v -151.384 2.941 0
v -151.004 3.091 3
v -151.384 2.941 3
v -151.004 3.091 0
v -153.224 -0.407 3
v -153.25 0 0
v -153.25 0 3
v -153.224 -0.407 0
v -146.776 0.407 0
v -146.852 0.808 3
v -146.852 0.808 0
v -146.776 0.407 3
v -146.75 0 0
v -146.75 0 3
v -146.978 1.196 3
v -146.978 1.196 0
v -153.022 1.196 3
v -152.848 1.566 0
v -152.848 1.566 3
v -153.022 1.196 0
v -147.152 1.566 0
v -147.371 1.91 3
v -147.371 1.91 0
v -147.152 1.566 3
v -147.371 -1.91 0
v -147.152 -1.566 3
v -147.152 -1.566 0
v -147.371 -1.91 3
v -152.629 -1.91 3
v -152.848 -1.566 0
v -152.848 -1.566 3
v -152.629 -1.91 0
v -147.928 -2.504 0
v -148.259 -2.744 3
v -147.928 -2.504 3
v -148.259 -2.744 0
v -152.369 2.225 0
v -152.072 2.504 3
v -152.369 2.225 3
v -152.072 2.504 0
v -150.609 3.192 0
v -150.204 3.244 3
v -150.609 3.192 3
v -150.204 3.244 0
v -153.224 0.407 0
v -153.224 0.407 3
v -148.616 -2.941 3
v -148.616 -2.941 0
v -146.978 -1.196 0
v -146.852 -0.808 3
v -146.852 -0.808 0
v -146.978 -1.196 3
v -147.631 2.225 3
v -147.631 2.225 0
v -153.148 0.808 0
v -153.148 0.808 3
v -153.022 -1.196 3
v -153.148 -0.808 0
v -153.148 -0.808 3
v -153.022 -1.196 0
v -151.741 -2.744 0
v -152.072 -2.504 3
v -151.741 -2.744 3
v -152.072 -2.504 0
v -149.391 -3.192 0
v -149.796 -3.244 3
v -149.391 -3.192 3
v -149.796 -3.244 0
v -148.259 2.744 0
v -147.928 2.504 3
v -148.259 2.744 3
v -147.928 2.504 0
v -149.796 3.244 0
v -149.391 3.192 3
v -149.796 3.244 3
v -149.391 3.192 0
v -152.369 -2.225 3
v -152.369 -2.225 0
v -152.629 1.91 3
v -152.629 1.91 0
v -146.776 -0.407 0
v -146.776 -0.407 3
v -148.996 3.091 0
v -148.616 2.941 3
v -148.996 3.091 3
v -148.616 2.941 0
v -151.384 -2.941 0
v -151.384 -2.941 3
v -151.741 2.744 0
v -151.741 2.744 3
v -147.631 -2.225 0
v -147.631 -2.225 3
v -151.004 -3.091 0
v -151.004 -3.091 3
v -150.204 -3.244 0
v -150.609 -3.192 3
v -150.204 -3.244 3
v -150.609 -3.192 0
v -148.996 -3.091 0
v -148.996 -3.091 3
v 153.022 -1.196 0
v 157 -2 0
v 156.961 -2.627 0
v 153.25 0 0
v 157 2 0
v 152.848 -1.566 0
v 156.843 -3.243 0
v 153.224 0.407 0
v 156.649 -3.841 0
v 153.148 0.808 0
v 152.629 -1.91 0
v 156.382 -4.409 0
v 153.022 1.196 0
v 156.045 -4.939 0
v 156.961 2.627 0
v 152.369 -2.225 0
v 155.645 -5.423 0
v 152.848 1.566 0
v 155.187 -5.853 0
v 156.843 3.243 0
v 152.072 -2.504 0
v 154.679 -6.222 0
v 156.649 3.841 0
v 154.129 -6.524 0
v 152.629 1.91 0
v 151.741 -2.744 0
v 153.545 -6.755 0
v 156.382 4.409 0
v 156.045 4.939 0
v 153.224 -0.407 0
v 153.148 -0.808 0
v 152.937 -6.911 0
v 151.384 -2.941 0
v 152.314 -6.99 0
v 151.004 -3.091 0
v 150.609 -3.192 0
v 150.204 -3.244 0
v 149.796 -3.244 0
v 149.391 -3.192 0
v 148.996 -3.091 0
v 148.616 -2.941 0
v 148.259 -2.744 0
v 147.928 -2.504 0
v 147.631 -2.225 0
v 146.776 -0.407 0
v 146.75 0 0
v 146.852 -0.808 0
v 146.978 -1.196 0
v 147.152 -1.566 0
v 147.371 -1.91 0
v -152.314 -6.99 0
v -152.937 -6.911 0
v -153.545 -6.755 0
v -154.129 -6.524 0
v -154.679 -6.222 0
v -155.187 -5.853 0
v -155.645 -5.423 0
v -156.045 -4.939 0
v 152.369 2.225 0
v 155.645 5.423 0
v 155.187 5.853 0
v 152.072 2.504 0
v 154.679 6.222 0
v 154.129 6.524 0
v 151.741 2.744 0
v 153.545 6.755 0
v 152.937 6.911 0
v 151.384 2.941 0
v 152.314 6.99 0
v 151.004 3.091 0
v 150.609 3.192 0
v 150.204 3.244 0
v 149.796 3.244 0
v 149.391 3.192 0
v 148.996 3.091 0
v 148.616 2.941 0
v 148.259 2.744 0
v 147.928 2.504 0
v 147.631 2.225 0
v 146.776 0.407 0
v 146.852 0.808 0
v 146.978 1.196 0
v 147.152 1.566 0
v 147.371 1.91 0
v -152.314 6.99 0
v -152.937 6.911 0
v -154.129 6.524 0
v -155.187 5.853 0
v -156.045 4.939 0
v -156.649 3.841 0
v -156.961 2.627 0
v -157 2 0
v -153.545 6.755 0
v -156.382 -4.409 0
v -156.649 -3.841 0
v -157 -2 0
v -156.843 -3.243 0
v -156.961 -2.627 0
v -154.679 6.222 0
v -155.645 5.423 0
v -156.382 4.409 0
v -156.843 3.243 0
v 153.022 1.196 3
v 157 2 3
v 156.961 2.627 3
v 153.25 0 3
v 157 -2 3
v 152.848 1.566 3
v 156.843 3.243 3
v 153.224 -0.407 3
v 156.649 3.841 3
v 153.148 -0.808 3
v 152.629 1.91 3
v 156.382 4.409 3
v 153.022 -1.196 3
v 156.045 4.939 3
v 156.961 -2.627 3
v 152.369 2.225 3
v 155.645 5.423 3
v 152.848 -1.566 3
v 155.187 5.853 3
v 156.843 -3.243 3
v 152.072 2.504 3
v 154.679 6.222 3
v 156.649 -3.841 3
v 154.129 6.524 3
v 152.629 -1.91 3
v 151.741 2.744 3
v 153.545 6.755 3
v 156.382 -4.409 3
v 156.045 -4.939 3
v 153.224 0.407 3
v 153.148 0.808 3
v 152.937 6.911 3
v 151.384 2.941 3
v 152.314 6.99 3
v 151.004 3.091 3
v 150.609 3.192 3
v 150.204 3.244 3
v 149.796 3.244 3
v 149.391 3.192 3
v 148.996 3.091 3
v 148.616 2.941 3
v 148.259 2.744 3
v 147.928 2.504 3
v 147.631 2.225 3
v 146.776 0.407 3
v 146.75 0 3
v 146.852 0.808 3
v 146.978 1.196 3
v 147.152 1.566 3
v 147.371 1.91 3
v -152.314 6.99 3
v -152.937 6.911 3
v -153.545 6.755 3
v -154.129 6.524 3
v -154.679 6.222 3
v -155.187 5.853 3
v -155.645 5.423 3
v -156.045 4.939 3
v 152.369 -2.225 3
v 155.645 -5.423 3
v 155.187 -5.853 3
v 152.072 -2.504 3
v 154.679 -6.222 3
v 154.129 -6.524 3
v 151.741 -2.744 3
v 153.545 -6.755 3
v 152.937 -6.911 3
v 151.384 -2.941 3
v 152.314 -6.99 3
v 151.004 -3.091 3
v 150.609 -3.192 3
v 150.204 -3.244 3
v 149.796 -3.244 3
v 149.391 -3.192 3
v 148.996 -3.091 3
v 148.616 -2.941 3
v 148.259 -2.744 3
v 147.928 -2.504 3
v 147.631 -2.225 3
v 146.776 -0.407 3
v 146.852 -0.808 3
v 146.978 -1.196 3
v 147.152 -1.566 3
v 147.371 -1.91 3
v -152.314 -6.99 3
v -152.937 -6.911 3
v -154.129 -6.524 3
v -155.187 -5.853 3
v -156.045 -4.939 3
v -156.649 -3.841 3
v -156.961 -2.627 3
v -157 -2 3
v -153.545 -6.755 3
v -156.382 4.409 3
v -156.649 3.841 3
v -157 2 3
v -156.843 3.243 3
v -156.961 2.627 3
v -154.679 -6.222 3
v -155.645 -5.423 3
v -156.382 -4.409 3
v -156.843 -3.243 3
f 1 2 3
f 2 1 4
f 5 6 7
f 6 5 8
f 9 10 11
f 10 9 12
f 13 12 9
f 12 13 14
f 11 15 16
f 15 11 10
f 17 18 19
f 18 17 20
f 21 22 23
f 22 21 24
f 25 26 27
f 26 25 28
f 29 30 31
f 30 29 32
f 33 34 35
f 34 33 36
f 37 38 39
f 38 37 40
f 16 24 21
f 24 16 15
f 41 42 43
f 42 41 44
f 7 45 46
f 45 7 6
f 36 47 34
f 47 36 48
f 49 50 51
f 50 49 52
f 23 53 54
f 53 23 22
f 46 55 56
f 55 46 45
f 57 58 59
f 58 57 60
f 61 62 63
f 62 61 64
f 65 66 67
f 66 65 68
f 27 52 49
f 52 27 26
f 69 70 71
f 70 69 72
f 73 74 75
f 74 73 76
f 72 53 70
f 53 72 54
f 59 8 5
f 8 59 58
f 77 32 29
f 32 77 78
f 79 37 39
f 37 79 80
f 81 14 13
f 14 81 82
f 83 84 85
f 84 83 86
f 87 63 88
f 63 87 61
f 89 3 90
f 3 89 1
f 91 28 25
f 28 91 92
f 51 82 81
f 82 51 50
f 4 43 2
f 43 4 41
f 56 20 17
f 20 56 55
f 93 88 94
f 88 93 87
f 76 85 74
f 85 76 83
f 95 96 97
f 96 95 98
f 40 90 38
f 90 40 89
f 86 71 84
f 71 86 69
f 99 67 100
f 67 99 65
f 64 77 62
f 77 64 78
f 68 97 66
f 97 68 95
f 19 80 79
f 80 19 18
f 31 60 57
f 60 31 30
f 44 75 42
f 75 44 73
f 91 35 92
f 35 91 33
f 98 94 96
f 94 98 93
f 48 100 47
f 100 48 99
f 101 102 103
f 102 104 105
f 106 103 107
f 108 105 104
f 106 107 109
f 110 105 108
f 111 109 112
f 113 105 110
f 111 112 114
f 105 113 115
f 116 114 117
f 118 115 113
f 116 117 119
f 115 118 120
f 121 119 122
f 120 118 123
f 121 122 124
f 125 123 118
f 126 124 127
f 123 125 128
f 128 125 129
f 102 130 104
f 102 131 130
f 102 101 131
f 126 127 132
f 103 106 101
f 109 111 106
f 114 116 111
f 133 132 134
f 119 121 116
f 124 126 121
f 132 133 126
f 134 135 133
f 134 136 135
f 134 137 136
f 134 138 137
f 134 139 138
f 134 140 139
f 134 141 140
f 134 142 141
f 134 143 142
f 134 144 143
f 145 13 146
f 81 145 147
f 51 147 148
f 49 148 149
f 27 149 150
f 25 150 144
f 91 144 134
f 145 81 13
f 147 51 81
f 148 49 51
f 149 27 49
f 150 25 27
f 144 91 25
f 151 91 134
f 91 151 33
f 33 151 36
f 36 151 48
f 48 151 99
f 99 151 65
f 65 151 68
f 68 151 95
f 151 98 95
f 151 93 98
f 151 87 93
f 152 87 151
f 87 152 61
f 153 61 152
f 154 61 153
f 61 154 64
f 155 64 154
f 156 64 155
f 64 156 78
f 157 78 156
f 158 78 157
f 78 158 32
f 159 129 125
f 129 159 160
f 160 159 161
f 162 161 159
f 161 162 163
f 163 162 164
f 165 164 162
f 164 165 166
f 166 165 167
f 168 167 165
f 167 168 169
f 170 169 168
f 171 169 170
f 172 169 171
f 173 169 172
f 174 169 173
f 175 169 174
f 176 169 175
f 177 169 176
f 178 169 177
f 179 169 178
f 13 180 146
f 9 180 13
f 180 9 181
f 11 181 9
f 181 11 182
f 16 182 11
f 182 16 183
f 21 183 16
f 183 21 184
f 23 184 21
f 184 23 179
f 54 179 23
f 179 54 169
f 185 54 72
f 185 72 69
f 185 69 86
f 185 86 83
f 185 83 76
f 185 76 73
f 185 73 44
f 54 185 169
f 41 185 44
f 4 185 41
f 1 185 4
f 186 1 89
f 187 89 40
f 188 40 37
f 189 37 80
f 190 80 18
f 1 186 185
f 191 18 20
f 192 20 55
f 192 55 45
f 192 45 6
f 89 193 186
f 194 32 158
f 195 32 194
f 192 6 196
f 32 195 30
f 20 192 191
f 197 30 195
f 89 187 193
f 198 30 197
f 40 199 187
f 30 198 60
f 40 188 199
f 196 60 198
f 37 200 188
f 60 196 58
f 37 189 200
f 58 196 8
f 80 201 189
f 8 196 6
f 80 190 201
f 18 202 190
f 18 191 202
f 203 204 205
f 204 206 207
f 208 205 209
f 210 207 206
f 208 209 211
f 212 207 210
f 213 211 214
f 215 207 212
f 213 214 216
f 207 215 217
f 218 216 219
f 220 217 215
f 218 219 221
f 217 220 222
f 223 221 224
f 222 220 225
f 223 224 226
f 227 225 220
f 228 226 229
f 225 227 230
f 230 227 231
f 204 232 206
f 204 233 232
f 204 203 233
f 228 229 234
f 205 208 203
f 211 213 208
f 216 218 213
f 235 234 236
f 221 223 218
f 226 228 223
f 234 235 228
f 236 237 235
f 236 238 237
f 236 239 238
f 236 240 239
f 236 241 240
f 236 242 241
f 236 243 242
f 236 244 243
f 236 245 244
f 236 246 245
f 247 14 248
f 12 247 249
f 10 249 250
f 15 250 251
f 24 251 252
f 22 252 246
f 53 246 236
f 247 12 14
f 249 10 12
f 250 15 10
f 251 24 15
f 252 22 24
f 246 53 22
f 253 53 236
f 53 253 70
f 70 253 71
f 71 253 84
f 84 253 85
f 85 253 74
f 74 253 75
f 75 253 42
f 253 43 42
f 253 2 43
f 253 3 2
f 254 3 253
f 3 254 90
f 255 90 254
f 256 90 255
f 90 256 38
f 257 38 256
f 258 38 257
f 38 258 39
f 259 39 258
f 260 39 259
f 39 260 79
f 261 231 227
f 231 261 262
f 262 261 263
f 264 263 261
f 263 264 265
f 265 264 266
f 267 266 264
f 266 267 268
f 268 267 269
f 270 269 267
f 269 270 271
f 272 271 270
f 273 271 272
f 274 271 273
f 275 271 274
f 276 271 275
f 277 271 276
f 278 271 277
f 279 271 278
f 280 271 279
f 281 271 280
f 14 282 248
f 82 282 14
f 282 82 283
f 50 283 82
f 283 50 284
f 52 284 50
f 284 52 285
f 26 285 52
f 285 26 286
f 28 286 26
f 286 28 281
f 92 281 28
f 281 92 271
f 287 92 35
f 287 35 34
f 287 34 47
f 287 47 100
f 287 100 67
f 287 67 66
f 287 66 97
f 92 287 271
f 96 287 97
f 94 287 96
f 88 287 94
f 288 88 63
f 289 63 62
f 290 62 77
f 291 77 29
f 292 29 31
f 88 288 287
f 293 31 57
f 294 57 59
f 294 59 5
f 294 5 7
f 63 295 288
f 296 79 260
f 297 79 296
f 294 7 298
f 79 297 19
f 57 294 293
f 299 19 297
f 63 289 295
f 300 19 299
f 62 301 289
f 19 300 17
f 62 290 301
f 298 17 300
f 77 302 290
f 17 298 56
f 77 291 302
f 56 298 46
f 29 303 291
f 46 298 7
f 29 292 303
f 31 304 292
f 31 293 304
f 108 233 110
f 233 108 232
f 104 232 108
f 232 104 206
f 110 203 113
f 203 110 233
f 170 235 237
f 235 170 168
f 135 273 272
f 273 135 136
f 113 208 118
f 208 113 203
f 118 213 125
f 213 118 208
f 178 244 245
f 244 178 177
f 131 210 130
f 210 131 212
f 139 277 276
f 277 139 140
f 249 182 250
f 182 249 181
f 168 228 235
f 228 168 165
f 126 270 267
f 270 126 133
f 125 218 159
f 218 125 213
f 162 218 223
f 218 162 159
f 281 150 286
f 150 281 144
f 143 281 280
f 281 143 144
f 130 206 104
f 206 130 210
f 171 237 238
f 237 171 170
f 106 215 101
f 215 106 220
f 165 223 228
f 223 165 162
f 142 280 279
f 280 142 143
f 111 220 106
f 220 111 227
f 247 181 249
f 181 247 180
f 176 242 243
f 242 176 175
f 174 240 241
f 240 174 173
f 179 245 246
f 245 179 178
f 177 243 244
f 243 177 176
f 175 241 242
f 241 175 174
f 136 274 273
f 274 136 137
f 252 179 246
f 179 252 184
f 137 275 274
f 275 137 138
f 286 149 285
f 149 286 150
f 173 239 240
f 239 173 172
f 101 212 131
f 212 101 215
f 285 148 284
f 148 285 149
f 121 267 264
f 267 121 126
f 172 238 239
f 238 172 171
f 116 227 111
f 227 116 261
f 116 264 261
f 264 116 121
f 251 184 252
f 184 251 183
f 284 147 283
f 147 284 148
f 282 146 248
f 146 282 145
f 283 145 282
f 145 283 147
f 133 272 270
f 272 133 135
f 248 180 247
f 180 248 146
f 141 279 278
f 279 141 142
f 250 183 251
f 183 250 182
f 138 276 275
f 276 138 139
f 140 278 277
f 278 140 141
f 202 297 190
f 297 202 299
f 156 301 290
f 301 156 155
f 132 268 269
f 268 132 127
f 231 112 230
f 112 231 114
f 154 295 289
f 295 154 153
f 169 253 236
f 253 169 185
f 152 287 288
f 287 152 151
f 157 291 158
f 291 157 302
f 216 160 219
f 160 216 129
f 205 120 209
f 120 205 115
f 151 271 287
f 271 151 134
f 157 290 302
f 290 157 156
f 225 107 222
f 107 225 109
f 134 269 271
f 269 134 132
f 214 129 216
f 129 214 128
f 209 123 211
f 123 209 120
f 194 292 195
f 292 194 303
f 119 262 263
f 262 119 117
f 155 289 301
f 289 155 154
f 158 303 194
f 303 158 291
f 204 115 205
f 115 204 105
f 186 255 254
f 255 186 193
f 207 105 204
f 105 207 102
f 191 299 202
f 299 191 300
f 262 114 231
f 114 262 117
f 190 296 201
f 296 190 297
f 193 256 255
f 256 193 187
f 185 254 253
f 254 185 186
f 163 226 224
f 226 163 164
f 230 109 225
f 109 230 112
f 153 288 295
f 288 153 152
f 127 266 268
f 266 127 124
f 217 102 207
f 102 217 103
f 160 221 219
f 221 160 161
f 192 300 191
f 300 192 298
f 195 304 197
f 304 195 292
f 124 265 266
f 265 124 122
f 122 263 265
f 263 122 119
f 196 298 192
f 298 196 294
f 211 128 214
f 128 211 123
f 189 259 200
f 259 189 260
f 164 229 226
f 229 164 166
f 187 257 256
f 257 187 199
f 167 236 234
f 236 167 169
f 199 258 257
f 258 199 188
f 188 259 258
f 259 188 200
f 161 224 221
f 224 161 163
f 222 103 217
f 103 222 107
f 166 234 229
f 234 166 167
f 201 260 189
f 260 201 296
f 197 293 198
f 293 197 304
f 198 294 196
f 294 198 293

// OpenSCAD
$fn = 50;


difference() {
	union() {
		hull() {
			translate(v = [-152.0000000000, 2.0000000000, 0]) {
				cylinder(h = 3, r = 5);
			}
			translate(v = [152.0000000000, 2.0000000000, 0]) {
				cylinder(h = 3, r = 5);
			}
			translate(v = [-152.0000000000, -2.0000000000, 0]) {
				cylinder(h = 3, r = 5);
			}
			translate(v = [152.0000000000, -2.0000000000, 0]) {
				cylinder(h = 3, r = 5);
			}
		}
	}
	union() {
		translate(v = [-150.0000000000, 0.0000000000, 0]) {
			cylinder(h = 3, r = 3.2500000000);
		}
		translate(v = [150.0000000000, 0.0000000000, 0]) {
			cylinder(h = 3, r = 3.2500000000);
		}
		translate(v = [-150.0000000000, 0.0000000000, 0]) {
			cylinder(h = 3, r = 1.8000000000);
		}
		translate(v = [150.0000000000, 0.0000000000, 0]) {
			cylinder(h = 3, r = 1.8000000000);
		}
		translate(v = [-150.0000000000, 0.0000000000, 0]) {
			cylinder(h = 3, r = 1.8000000000);
		}
		translate(v = [150.0000000000, 0.0000000000, 0]) {
			cylinder(h = 3, r = 1.8000000000);
		}
		translate(v = [-150.0000000000, 0.0000000000, 0]) {
			cylinder(h = 3, r = 1.8000000000);
		}
		translate(v = [150.0000000000, 0.0000000000, 0]) {
			cylinder(h = 3, r = 1.8000000000);
		}
	}
}
